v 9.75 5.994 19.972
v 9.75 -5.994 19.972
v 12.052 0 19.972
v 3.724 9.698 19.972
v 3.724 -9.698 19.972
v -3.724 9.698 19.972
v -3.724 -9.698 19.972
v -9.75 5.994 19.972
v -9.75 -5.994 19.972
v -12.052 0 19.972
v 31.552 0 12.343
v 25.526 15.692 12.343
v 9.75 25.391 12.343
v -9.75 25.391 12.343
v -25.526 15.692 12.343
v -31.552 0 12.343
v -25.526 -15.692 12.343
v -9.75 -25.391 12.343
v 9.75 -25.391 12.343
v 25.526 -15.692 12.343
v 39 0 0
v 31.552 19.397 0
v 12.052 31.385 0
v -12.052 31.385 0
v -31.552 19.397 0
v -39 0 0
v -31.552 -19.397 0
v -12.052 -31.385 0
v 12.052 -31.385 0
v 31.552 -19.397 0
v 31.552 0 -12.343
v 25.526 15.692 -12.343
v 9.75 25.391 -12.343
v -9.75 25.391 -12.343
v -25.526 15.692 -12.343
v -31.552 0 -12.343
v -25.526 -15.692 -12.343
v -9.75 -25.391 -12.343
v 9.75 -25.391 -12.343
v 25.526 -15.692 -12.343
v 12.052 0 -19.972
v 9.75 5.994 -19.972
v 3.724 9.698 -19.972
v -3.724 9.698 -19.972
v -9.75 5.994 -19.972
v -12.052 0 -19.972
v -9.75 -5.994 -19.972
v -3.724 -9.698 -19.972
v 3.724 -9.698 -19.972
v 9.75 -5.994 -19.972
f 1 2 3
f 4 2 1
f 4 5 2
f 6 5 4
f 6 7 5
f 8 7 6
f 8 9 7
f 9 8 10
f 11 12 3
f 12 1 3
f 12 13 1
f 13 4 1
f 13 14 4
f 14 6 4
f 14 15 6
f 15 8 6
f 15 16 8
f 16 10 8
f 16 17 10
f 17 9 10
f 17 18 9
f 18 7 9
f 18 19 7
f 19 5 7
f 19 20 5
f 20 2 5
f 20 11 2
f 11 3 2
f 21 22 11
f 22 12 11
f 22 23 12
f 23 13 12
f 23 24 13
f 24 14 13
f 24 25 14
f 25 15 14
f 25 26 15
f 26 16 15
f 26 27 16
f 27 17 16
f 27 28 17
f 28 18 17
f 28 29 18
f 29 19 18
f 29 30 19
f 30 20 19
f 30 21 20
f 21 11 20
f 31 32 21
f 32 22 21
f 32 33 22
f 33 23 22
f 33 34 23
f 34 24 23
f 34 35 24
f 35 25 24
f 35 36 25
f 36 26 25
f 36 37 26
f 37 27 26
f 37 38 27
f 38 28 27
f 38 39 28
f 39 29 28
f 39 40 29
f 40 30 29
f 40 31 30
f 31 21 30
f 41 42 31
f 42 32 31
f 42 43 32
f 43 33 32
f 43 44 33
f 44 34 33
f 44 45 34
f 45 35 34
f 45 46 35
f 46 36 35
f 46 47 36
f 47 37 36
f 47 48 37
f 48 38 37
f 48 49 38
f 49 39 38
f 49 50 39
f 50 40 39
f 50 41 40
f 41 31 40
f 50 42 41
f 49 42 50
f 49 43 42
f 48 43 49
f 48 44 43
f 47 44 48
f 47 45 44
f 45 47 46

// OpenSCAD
// Generated by SolidPython 1.0.1 on 2020-07-29 00:46:50


scale(v = [13, 11, 7]) {
	sphere(r = 3);
}
/***********************************************
*********      SolidPython code:      **********
************************************************
 
# import packages: SolidPython
from solid import *
from solid.utils import *
from itertools import chain, combinations, permutations


class Resize:

    def __init__(self, scad_file):
        self.scad_file = scad_file
        #self.scad_file = import_scad(scad_file)
        # cone/cylinder param:
        self.r1 = 0
        self.r2 = 0
        self.h = 0
        # rectangular prism param:
        self.w = 0
        self.l = 0
        # ellipse param:
        self.r = 0

    # import OpenScad code (file name corresponds to shape)


    # classify shape + parameters
    def assign(self, param1, param2, param3):
        if self.scad_file == 'cone.scad':
            self.r1 = param1
            self.r2 = param2
            self.h = param3
        elif self.scad_file == 'cylinder.scad':
            self.r1 = param1
            self.r2 = param2
            self.h = param3
        elif self.scad_file == 'rectangularPrism.scad':
            self.h = param1
            self.l = param2
            self.w = param3
        else:
            self.r = param1
            self.h = param2

    # resize parameters
    def iterate(self):
        x = range(3, 20, 2)
        i = 1
        if self.scad_file == 'cone.scad':
            tempList = list(permutations(x, 2))
            for temp in tempList:
                param1 = temp[0]
                param2 = temp[1]
                filepath = 'produced_scad_files/' + 'cone' + str(param1) + '_' + str(param2) + '_' + '.scad'
                scad_render_to_file(cylinder(h=param1, r1=param2, r2=0), filepath)

        elif self.scad_file == 'cylinder.scad':
            tempList = list(permutations(x, 3))
            for temp in tempList:
                param1 = temp[0]
                param2 = temp[1]
                filepath = 'produced_scad_files/' + 'cylinder' + str(param1) + '_' + str(param2) + '_' + '.scad'
                scad_render_to_file(cylinder(h=param1, r1=param2, r2=param2), filepath)

        elif self.scad_file == 'rectangularPrism.scad':
            tempList = list(permutations(x, 3))
            for temp in tempList:
                param1 = temp[0]
                param2 = temp[1]
                param3 = temp[2]
                filepath = 'produced_scad_files/' + 'rectangularPrism' + str(param1) + '_' + str(param2) + '_' + str(
                    param3) + '.scad'
                scad_render_to_file(cube(size=(param1, param2, param3)), filepath)

        elif self.scad_file == 'ellipse.scad':
            tempList = list(permutations(x, 4))
            for temp in tempList:
                param1 = temp[0]
                param2 = temp[1]
                param3 = temp[2]
                param4 = temp[3]
                filepath = 'produced_scad_files/' + 'ellipse' + str(param1) + '_' + str(param2) + '_' + str(param3) + '_' + str(param4) + '.scad'
                scad_render_to_file(scale([param1, param2, param3])(sphere(r=param4)), filepath)

    def render_to_scadfile(self):
        scad_render_to_file(scad, 'example.scad') 
 
************************************************/
